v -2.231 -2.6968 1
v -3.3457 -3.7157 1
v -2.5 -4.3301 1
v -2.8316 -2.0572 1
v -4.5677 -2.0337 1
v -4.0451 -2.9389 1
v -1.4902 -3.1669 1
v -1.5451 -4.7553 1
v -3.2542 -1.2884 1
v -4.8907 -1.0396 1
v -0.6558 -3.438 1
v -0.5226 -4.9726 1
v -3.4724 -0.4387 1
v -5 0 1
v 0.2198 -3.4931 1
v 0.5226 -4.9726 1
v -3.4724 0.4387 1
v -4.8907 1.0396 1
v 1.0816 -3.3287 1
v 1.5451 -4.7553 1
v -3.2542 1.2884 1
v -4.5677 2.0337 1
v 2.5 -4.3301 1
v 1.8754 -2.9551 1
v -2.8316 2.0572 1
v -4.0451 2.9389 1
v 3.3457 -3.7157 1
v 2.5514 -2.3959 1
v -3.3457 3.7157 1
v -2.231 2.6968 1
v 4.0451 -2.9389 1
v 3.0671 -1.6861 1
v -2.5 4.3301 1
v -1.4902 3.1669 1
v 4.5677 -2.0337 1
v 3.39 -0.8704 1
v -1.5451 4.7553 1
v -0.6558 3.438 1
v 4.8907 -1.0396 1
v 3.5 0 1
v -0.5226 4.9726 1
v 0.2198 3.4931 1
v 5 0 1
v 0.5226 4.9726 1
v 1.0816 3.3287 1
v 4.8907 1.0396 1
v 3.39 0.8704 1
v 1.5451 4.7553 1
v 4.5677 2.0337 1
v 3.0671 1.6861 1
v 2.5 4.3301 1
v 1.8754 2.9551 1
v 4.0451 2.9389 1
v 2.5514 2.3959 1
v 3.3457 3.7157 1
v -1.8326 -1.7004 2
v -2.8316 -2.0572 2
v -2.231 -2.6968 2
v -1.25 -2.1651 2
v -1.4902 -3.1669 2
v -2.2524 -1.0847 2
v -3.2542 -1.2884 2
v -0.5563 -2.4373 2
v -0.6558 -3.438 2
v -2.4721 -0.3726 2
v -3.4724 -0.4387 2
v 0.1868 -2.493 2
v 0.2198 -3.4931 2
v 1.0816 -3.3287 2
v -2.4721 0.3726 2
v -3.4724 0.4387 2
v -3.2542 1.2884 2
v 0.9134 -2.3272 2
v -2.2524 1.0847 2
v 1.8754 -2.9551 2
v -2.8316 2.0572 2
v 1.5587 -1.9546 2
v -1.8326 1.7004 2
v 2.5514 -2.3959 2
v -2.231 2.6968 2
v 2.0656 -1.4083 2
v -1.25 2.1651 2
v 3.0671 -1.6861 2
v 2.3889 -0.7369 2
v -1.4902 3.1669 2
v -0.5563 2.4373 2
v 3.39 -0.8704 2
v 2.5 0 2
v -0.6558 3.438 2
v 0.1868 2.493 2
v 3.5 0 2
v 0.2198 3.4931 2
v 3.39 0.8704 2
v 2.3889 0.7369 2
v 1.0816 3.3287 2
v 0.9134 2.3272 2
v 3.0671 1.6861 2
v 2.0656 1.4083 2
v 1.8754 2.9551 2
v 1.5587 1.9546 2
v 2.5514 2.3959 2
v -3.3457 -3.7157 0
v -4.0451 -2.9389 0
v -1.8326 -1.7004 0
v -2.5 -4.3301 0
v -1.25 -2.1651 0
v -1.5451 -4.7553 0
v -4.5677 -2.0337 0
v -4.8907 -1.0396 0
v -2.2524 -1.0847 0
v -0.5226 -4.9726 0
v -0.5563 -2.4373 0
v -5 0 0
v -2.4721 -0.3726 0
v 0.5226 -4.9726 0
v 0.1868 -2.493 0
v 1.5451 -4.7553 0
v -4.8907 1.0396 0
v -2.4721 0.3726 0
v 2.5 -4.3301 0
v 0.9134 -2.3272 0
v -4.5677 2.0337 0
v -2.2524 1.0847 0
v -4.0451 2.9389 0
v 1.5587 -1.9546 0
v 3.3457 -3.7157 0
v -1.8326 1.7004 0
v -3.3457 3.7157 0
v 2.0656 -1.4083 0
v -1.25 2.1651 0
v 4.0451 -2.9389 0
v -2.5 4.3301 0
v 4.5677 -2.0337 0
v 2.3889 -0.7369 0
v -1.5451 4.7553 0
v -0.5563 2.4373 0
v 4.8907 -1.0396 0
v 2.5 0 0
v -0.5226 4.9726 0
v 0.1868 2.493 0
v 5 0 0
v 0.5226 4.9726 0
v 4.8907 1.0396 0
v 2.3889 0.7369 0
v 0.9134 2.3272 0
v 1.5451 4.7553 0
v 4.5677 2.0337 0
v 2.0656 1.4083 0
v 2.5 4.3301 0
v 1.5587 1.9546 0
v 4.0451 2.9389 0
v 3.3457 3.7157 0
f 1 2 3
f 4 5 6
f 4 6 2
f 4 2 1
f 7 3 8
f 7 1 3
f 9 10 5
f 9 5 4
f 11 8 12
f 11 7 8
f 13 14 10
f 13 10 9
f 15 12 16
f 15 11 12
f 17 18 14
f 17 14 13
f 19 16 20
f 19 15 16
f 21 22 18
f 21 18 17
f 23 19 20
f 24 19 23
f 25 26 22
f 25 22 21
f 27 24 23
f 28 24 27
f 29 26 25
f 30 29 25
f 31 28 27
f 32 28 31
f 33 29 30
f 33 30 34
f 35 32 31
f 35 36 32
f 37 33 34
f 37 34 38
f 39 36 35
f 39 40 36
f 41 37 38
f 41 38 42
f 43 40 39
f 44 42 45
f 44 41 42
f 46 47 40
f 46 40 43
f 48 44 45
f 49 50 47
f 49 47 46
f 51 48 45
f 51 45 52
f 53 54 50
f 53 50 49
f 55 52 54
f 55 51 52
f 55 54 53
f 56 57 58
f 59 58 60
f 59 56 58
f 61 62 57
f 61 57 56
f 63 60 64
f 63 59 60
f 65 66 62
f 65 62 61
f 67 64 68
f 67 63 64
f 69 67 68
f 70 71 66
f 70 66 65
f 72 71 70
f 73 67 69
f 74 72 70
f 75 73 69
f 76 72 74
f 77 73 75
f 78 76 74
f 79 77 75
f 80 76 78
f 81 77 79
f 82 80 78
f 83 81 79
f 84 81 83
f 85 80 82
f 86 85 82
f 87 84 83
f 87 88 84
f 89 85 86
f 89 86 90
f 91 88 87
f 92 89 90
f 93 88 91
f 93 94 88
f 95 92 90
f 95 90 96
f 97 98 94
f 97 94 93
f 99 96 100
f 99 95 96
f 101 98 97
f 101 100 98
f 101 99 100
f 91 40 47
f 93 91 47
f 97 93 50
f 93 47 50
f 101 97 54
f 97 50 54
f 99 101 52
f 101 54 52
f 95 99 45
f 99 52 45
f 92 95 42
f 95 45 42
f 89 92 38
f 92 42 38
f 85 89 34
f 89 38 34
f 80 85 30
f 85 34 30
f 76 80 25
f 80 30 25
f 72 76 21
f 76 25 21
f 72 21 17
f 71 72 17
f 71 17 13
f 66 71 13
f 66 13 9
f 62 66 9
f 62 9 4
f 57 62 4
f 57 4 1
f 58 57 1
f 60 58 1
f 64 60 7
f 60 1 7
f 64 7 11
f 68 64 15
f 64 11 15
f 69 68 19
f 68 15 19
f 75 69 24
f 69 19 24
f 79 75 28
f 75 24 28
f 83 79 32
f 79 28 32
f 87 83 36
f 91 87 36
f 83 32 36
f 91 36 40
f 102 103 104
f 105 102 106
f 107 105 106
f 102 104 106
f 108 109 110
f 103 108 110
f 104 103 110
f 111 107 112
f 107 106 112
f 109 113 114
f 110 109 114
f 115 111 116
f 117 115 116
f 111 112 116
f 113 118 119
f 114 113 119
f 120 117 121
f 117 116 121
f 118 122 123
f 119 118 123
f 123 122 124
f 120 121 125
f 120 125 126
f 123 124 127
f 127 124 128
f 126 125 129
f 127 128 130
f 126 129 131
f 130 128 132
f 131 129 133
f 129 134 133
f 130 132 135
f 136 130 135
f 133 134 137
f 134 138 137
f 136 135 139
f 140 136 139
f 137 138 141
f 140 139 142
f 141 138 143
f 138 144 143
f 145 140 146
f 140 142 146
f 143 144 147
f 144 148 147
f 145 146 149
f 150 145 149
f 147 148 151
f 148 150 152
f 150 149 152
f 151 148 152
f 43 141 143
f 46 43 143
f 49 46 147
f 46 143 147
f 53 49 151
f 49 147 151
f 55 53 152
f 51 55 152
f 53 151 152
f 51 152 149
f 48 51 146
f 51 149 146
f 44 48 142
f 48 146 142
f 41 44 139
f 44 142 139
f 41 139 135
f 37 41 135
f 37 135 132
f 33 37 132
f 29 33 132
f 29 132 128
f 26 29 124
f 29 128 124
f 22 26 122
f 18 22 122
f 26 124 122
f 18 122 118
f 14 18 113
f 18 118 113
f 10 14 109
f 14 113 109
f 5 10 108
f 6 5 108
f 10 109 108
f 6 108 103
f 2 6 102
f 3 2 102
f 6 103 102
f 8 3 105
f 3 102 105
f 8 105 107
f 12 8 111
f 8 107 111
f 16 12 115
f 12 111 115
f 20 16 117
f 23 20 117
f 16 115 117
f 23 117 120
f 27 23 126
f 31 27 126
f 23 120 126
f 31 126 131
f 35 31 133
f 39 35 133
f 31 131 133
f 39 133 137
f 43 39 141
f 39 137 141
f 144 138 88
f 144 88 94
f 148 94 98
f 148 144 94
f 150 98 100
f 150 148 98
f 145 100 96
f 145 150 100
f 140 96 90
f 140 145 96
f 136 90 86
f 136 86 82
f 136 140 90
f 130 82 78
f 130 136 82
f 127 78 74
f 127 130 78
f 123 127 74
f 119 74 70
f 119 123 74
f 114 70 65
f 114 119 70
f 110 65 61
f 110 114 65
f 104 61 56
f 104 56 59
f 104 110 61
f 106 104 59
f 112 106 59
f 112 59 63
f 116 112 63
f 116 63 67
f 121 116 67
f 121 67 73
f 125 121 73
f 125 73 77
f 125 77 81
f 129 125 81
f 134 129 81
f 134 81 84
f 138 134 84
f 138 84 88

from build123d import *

# Parameters (mm, degrees)
SKETCH_1_R          = 5
EXTRUDE_1_DEPTH     = 1
SKETCH_2_R          = 3.5
SKETCH_2_R_2        = 2.5
EXTRUDE_2_DEPTH     = 1
CUT_EXTRUDE_START   = -5
SKETCH_3_R          = 2.5
CUT_EXTRUDE_1_DEPTH = 5


with BuildPart() as part:
    # 草图1 → 凸台-拉伸1 (new body)
    with BuildSketch(Plane.XY):
        Circle(SKETCH_1_R)
    extrude(amount=EXTRUDE_1_DEPTH)

    # 草图2 → 凸台-拉伸2 (add)
    with BuildSketch(Plane.XY.offset(1)):
        Circle(SKETCH_2_R)
        Circle(SKETCH_2_R_2, mode=Mode.SUBTRACT)
    extrude(amount=EXTRUDE_2_DEPTH)

    # 草图3 → 切除-拉伸1 (cut)
    with BuildSketch(Plane.XY.offset(1).offset(CUT_EXTRUDE_START)):
        Circle(SKETCH_3_R)
    extrude(amount=CUT_EXTRUDE_1_DEPTH, mode=Mode.SUBTRACT)


solid = part.part
